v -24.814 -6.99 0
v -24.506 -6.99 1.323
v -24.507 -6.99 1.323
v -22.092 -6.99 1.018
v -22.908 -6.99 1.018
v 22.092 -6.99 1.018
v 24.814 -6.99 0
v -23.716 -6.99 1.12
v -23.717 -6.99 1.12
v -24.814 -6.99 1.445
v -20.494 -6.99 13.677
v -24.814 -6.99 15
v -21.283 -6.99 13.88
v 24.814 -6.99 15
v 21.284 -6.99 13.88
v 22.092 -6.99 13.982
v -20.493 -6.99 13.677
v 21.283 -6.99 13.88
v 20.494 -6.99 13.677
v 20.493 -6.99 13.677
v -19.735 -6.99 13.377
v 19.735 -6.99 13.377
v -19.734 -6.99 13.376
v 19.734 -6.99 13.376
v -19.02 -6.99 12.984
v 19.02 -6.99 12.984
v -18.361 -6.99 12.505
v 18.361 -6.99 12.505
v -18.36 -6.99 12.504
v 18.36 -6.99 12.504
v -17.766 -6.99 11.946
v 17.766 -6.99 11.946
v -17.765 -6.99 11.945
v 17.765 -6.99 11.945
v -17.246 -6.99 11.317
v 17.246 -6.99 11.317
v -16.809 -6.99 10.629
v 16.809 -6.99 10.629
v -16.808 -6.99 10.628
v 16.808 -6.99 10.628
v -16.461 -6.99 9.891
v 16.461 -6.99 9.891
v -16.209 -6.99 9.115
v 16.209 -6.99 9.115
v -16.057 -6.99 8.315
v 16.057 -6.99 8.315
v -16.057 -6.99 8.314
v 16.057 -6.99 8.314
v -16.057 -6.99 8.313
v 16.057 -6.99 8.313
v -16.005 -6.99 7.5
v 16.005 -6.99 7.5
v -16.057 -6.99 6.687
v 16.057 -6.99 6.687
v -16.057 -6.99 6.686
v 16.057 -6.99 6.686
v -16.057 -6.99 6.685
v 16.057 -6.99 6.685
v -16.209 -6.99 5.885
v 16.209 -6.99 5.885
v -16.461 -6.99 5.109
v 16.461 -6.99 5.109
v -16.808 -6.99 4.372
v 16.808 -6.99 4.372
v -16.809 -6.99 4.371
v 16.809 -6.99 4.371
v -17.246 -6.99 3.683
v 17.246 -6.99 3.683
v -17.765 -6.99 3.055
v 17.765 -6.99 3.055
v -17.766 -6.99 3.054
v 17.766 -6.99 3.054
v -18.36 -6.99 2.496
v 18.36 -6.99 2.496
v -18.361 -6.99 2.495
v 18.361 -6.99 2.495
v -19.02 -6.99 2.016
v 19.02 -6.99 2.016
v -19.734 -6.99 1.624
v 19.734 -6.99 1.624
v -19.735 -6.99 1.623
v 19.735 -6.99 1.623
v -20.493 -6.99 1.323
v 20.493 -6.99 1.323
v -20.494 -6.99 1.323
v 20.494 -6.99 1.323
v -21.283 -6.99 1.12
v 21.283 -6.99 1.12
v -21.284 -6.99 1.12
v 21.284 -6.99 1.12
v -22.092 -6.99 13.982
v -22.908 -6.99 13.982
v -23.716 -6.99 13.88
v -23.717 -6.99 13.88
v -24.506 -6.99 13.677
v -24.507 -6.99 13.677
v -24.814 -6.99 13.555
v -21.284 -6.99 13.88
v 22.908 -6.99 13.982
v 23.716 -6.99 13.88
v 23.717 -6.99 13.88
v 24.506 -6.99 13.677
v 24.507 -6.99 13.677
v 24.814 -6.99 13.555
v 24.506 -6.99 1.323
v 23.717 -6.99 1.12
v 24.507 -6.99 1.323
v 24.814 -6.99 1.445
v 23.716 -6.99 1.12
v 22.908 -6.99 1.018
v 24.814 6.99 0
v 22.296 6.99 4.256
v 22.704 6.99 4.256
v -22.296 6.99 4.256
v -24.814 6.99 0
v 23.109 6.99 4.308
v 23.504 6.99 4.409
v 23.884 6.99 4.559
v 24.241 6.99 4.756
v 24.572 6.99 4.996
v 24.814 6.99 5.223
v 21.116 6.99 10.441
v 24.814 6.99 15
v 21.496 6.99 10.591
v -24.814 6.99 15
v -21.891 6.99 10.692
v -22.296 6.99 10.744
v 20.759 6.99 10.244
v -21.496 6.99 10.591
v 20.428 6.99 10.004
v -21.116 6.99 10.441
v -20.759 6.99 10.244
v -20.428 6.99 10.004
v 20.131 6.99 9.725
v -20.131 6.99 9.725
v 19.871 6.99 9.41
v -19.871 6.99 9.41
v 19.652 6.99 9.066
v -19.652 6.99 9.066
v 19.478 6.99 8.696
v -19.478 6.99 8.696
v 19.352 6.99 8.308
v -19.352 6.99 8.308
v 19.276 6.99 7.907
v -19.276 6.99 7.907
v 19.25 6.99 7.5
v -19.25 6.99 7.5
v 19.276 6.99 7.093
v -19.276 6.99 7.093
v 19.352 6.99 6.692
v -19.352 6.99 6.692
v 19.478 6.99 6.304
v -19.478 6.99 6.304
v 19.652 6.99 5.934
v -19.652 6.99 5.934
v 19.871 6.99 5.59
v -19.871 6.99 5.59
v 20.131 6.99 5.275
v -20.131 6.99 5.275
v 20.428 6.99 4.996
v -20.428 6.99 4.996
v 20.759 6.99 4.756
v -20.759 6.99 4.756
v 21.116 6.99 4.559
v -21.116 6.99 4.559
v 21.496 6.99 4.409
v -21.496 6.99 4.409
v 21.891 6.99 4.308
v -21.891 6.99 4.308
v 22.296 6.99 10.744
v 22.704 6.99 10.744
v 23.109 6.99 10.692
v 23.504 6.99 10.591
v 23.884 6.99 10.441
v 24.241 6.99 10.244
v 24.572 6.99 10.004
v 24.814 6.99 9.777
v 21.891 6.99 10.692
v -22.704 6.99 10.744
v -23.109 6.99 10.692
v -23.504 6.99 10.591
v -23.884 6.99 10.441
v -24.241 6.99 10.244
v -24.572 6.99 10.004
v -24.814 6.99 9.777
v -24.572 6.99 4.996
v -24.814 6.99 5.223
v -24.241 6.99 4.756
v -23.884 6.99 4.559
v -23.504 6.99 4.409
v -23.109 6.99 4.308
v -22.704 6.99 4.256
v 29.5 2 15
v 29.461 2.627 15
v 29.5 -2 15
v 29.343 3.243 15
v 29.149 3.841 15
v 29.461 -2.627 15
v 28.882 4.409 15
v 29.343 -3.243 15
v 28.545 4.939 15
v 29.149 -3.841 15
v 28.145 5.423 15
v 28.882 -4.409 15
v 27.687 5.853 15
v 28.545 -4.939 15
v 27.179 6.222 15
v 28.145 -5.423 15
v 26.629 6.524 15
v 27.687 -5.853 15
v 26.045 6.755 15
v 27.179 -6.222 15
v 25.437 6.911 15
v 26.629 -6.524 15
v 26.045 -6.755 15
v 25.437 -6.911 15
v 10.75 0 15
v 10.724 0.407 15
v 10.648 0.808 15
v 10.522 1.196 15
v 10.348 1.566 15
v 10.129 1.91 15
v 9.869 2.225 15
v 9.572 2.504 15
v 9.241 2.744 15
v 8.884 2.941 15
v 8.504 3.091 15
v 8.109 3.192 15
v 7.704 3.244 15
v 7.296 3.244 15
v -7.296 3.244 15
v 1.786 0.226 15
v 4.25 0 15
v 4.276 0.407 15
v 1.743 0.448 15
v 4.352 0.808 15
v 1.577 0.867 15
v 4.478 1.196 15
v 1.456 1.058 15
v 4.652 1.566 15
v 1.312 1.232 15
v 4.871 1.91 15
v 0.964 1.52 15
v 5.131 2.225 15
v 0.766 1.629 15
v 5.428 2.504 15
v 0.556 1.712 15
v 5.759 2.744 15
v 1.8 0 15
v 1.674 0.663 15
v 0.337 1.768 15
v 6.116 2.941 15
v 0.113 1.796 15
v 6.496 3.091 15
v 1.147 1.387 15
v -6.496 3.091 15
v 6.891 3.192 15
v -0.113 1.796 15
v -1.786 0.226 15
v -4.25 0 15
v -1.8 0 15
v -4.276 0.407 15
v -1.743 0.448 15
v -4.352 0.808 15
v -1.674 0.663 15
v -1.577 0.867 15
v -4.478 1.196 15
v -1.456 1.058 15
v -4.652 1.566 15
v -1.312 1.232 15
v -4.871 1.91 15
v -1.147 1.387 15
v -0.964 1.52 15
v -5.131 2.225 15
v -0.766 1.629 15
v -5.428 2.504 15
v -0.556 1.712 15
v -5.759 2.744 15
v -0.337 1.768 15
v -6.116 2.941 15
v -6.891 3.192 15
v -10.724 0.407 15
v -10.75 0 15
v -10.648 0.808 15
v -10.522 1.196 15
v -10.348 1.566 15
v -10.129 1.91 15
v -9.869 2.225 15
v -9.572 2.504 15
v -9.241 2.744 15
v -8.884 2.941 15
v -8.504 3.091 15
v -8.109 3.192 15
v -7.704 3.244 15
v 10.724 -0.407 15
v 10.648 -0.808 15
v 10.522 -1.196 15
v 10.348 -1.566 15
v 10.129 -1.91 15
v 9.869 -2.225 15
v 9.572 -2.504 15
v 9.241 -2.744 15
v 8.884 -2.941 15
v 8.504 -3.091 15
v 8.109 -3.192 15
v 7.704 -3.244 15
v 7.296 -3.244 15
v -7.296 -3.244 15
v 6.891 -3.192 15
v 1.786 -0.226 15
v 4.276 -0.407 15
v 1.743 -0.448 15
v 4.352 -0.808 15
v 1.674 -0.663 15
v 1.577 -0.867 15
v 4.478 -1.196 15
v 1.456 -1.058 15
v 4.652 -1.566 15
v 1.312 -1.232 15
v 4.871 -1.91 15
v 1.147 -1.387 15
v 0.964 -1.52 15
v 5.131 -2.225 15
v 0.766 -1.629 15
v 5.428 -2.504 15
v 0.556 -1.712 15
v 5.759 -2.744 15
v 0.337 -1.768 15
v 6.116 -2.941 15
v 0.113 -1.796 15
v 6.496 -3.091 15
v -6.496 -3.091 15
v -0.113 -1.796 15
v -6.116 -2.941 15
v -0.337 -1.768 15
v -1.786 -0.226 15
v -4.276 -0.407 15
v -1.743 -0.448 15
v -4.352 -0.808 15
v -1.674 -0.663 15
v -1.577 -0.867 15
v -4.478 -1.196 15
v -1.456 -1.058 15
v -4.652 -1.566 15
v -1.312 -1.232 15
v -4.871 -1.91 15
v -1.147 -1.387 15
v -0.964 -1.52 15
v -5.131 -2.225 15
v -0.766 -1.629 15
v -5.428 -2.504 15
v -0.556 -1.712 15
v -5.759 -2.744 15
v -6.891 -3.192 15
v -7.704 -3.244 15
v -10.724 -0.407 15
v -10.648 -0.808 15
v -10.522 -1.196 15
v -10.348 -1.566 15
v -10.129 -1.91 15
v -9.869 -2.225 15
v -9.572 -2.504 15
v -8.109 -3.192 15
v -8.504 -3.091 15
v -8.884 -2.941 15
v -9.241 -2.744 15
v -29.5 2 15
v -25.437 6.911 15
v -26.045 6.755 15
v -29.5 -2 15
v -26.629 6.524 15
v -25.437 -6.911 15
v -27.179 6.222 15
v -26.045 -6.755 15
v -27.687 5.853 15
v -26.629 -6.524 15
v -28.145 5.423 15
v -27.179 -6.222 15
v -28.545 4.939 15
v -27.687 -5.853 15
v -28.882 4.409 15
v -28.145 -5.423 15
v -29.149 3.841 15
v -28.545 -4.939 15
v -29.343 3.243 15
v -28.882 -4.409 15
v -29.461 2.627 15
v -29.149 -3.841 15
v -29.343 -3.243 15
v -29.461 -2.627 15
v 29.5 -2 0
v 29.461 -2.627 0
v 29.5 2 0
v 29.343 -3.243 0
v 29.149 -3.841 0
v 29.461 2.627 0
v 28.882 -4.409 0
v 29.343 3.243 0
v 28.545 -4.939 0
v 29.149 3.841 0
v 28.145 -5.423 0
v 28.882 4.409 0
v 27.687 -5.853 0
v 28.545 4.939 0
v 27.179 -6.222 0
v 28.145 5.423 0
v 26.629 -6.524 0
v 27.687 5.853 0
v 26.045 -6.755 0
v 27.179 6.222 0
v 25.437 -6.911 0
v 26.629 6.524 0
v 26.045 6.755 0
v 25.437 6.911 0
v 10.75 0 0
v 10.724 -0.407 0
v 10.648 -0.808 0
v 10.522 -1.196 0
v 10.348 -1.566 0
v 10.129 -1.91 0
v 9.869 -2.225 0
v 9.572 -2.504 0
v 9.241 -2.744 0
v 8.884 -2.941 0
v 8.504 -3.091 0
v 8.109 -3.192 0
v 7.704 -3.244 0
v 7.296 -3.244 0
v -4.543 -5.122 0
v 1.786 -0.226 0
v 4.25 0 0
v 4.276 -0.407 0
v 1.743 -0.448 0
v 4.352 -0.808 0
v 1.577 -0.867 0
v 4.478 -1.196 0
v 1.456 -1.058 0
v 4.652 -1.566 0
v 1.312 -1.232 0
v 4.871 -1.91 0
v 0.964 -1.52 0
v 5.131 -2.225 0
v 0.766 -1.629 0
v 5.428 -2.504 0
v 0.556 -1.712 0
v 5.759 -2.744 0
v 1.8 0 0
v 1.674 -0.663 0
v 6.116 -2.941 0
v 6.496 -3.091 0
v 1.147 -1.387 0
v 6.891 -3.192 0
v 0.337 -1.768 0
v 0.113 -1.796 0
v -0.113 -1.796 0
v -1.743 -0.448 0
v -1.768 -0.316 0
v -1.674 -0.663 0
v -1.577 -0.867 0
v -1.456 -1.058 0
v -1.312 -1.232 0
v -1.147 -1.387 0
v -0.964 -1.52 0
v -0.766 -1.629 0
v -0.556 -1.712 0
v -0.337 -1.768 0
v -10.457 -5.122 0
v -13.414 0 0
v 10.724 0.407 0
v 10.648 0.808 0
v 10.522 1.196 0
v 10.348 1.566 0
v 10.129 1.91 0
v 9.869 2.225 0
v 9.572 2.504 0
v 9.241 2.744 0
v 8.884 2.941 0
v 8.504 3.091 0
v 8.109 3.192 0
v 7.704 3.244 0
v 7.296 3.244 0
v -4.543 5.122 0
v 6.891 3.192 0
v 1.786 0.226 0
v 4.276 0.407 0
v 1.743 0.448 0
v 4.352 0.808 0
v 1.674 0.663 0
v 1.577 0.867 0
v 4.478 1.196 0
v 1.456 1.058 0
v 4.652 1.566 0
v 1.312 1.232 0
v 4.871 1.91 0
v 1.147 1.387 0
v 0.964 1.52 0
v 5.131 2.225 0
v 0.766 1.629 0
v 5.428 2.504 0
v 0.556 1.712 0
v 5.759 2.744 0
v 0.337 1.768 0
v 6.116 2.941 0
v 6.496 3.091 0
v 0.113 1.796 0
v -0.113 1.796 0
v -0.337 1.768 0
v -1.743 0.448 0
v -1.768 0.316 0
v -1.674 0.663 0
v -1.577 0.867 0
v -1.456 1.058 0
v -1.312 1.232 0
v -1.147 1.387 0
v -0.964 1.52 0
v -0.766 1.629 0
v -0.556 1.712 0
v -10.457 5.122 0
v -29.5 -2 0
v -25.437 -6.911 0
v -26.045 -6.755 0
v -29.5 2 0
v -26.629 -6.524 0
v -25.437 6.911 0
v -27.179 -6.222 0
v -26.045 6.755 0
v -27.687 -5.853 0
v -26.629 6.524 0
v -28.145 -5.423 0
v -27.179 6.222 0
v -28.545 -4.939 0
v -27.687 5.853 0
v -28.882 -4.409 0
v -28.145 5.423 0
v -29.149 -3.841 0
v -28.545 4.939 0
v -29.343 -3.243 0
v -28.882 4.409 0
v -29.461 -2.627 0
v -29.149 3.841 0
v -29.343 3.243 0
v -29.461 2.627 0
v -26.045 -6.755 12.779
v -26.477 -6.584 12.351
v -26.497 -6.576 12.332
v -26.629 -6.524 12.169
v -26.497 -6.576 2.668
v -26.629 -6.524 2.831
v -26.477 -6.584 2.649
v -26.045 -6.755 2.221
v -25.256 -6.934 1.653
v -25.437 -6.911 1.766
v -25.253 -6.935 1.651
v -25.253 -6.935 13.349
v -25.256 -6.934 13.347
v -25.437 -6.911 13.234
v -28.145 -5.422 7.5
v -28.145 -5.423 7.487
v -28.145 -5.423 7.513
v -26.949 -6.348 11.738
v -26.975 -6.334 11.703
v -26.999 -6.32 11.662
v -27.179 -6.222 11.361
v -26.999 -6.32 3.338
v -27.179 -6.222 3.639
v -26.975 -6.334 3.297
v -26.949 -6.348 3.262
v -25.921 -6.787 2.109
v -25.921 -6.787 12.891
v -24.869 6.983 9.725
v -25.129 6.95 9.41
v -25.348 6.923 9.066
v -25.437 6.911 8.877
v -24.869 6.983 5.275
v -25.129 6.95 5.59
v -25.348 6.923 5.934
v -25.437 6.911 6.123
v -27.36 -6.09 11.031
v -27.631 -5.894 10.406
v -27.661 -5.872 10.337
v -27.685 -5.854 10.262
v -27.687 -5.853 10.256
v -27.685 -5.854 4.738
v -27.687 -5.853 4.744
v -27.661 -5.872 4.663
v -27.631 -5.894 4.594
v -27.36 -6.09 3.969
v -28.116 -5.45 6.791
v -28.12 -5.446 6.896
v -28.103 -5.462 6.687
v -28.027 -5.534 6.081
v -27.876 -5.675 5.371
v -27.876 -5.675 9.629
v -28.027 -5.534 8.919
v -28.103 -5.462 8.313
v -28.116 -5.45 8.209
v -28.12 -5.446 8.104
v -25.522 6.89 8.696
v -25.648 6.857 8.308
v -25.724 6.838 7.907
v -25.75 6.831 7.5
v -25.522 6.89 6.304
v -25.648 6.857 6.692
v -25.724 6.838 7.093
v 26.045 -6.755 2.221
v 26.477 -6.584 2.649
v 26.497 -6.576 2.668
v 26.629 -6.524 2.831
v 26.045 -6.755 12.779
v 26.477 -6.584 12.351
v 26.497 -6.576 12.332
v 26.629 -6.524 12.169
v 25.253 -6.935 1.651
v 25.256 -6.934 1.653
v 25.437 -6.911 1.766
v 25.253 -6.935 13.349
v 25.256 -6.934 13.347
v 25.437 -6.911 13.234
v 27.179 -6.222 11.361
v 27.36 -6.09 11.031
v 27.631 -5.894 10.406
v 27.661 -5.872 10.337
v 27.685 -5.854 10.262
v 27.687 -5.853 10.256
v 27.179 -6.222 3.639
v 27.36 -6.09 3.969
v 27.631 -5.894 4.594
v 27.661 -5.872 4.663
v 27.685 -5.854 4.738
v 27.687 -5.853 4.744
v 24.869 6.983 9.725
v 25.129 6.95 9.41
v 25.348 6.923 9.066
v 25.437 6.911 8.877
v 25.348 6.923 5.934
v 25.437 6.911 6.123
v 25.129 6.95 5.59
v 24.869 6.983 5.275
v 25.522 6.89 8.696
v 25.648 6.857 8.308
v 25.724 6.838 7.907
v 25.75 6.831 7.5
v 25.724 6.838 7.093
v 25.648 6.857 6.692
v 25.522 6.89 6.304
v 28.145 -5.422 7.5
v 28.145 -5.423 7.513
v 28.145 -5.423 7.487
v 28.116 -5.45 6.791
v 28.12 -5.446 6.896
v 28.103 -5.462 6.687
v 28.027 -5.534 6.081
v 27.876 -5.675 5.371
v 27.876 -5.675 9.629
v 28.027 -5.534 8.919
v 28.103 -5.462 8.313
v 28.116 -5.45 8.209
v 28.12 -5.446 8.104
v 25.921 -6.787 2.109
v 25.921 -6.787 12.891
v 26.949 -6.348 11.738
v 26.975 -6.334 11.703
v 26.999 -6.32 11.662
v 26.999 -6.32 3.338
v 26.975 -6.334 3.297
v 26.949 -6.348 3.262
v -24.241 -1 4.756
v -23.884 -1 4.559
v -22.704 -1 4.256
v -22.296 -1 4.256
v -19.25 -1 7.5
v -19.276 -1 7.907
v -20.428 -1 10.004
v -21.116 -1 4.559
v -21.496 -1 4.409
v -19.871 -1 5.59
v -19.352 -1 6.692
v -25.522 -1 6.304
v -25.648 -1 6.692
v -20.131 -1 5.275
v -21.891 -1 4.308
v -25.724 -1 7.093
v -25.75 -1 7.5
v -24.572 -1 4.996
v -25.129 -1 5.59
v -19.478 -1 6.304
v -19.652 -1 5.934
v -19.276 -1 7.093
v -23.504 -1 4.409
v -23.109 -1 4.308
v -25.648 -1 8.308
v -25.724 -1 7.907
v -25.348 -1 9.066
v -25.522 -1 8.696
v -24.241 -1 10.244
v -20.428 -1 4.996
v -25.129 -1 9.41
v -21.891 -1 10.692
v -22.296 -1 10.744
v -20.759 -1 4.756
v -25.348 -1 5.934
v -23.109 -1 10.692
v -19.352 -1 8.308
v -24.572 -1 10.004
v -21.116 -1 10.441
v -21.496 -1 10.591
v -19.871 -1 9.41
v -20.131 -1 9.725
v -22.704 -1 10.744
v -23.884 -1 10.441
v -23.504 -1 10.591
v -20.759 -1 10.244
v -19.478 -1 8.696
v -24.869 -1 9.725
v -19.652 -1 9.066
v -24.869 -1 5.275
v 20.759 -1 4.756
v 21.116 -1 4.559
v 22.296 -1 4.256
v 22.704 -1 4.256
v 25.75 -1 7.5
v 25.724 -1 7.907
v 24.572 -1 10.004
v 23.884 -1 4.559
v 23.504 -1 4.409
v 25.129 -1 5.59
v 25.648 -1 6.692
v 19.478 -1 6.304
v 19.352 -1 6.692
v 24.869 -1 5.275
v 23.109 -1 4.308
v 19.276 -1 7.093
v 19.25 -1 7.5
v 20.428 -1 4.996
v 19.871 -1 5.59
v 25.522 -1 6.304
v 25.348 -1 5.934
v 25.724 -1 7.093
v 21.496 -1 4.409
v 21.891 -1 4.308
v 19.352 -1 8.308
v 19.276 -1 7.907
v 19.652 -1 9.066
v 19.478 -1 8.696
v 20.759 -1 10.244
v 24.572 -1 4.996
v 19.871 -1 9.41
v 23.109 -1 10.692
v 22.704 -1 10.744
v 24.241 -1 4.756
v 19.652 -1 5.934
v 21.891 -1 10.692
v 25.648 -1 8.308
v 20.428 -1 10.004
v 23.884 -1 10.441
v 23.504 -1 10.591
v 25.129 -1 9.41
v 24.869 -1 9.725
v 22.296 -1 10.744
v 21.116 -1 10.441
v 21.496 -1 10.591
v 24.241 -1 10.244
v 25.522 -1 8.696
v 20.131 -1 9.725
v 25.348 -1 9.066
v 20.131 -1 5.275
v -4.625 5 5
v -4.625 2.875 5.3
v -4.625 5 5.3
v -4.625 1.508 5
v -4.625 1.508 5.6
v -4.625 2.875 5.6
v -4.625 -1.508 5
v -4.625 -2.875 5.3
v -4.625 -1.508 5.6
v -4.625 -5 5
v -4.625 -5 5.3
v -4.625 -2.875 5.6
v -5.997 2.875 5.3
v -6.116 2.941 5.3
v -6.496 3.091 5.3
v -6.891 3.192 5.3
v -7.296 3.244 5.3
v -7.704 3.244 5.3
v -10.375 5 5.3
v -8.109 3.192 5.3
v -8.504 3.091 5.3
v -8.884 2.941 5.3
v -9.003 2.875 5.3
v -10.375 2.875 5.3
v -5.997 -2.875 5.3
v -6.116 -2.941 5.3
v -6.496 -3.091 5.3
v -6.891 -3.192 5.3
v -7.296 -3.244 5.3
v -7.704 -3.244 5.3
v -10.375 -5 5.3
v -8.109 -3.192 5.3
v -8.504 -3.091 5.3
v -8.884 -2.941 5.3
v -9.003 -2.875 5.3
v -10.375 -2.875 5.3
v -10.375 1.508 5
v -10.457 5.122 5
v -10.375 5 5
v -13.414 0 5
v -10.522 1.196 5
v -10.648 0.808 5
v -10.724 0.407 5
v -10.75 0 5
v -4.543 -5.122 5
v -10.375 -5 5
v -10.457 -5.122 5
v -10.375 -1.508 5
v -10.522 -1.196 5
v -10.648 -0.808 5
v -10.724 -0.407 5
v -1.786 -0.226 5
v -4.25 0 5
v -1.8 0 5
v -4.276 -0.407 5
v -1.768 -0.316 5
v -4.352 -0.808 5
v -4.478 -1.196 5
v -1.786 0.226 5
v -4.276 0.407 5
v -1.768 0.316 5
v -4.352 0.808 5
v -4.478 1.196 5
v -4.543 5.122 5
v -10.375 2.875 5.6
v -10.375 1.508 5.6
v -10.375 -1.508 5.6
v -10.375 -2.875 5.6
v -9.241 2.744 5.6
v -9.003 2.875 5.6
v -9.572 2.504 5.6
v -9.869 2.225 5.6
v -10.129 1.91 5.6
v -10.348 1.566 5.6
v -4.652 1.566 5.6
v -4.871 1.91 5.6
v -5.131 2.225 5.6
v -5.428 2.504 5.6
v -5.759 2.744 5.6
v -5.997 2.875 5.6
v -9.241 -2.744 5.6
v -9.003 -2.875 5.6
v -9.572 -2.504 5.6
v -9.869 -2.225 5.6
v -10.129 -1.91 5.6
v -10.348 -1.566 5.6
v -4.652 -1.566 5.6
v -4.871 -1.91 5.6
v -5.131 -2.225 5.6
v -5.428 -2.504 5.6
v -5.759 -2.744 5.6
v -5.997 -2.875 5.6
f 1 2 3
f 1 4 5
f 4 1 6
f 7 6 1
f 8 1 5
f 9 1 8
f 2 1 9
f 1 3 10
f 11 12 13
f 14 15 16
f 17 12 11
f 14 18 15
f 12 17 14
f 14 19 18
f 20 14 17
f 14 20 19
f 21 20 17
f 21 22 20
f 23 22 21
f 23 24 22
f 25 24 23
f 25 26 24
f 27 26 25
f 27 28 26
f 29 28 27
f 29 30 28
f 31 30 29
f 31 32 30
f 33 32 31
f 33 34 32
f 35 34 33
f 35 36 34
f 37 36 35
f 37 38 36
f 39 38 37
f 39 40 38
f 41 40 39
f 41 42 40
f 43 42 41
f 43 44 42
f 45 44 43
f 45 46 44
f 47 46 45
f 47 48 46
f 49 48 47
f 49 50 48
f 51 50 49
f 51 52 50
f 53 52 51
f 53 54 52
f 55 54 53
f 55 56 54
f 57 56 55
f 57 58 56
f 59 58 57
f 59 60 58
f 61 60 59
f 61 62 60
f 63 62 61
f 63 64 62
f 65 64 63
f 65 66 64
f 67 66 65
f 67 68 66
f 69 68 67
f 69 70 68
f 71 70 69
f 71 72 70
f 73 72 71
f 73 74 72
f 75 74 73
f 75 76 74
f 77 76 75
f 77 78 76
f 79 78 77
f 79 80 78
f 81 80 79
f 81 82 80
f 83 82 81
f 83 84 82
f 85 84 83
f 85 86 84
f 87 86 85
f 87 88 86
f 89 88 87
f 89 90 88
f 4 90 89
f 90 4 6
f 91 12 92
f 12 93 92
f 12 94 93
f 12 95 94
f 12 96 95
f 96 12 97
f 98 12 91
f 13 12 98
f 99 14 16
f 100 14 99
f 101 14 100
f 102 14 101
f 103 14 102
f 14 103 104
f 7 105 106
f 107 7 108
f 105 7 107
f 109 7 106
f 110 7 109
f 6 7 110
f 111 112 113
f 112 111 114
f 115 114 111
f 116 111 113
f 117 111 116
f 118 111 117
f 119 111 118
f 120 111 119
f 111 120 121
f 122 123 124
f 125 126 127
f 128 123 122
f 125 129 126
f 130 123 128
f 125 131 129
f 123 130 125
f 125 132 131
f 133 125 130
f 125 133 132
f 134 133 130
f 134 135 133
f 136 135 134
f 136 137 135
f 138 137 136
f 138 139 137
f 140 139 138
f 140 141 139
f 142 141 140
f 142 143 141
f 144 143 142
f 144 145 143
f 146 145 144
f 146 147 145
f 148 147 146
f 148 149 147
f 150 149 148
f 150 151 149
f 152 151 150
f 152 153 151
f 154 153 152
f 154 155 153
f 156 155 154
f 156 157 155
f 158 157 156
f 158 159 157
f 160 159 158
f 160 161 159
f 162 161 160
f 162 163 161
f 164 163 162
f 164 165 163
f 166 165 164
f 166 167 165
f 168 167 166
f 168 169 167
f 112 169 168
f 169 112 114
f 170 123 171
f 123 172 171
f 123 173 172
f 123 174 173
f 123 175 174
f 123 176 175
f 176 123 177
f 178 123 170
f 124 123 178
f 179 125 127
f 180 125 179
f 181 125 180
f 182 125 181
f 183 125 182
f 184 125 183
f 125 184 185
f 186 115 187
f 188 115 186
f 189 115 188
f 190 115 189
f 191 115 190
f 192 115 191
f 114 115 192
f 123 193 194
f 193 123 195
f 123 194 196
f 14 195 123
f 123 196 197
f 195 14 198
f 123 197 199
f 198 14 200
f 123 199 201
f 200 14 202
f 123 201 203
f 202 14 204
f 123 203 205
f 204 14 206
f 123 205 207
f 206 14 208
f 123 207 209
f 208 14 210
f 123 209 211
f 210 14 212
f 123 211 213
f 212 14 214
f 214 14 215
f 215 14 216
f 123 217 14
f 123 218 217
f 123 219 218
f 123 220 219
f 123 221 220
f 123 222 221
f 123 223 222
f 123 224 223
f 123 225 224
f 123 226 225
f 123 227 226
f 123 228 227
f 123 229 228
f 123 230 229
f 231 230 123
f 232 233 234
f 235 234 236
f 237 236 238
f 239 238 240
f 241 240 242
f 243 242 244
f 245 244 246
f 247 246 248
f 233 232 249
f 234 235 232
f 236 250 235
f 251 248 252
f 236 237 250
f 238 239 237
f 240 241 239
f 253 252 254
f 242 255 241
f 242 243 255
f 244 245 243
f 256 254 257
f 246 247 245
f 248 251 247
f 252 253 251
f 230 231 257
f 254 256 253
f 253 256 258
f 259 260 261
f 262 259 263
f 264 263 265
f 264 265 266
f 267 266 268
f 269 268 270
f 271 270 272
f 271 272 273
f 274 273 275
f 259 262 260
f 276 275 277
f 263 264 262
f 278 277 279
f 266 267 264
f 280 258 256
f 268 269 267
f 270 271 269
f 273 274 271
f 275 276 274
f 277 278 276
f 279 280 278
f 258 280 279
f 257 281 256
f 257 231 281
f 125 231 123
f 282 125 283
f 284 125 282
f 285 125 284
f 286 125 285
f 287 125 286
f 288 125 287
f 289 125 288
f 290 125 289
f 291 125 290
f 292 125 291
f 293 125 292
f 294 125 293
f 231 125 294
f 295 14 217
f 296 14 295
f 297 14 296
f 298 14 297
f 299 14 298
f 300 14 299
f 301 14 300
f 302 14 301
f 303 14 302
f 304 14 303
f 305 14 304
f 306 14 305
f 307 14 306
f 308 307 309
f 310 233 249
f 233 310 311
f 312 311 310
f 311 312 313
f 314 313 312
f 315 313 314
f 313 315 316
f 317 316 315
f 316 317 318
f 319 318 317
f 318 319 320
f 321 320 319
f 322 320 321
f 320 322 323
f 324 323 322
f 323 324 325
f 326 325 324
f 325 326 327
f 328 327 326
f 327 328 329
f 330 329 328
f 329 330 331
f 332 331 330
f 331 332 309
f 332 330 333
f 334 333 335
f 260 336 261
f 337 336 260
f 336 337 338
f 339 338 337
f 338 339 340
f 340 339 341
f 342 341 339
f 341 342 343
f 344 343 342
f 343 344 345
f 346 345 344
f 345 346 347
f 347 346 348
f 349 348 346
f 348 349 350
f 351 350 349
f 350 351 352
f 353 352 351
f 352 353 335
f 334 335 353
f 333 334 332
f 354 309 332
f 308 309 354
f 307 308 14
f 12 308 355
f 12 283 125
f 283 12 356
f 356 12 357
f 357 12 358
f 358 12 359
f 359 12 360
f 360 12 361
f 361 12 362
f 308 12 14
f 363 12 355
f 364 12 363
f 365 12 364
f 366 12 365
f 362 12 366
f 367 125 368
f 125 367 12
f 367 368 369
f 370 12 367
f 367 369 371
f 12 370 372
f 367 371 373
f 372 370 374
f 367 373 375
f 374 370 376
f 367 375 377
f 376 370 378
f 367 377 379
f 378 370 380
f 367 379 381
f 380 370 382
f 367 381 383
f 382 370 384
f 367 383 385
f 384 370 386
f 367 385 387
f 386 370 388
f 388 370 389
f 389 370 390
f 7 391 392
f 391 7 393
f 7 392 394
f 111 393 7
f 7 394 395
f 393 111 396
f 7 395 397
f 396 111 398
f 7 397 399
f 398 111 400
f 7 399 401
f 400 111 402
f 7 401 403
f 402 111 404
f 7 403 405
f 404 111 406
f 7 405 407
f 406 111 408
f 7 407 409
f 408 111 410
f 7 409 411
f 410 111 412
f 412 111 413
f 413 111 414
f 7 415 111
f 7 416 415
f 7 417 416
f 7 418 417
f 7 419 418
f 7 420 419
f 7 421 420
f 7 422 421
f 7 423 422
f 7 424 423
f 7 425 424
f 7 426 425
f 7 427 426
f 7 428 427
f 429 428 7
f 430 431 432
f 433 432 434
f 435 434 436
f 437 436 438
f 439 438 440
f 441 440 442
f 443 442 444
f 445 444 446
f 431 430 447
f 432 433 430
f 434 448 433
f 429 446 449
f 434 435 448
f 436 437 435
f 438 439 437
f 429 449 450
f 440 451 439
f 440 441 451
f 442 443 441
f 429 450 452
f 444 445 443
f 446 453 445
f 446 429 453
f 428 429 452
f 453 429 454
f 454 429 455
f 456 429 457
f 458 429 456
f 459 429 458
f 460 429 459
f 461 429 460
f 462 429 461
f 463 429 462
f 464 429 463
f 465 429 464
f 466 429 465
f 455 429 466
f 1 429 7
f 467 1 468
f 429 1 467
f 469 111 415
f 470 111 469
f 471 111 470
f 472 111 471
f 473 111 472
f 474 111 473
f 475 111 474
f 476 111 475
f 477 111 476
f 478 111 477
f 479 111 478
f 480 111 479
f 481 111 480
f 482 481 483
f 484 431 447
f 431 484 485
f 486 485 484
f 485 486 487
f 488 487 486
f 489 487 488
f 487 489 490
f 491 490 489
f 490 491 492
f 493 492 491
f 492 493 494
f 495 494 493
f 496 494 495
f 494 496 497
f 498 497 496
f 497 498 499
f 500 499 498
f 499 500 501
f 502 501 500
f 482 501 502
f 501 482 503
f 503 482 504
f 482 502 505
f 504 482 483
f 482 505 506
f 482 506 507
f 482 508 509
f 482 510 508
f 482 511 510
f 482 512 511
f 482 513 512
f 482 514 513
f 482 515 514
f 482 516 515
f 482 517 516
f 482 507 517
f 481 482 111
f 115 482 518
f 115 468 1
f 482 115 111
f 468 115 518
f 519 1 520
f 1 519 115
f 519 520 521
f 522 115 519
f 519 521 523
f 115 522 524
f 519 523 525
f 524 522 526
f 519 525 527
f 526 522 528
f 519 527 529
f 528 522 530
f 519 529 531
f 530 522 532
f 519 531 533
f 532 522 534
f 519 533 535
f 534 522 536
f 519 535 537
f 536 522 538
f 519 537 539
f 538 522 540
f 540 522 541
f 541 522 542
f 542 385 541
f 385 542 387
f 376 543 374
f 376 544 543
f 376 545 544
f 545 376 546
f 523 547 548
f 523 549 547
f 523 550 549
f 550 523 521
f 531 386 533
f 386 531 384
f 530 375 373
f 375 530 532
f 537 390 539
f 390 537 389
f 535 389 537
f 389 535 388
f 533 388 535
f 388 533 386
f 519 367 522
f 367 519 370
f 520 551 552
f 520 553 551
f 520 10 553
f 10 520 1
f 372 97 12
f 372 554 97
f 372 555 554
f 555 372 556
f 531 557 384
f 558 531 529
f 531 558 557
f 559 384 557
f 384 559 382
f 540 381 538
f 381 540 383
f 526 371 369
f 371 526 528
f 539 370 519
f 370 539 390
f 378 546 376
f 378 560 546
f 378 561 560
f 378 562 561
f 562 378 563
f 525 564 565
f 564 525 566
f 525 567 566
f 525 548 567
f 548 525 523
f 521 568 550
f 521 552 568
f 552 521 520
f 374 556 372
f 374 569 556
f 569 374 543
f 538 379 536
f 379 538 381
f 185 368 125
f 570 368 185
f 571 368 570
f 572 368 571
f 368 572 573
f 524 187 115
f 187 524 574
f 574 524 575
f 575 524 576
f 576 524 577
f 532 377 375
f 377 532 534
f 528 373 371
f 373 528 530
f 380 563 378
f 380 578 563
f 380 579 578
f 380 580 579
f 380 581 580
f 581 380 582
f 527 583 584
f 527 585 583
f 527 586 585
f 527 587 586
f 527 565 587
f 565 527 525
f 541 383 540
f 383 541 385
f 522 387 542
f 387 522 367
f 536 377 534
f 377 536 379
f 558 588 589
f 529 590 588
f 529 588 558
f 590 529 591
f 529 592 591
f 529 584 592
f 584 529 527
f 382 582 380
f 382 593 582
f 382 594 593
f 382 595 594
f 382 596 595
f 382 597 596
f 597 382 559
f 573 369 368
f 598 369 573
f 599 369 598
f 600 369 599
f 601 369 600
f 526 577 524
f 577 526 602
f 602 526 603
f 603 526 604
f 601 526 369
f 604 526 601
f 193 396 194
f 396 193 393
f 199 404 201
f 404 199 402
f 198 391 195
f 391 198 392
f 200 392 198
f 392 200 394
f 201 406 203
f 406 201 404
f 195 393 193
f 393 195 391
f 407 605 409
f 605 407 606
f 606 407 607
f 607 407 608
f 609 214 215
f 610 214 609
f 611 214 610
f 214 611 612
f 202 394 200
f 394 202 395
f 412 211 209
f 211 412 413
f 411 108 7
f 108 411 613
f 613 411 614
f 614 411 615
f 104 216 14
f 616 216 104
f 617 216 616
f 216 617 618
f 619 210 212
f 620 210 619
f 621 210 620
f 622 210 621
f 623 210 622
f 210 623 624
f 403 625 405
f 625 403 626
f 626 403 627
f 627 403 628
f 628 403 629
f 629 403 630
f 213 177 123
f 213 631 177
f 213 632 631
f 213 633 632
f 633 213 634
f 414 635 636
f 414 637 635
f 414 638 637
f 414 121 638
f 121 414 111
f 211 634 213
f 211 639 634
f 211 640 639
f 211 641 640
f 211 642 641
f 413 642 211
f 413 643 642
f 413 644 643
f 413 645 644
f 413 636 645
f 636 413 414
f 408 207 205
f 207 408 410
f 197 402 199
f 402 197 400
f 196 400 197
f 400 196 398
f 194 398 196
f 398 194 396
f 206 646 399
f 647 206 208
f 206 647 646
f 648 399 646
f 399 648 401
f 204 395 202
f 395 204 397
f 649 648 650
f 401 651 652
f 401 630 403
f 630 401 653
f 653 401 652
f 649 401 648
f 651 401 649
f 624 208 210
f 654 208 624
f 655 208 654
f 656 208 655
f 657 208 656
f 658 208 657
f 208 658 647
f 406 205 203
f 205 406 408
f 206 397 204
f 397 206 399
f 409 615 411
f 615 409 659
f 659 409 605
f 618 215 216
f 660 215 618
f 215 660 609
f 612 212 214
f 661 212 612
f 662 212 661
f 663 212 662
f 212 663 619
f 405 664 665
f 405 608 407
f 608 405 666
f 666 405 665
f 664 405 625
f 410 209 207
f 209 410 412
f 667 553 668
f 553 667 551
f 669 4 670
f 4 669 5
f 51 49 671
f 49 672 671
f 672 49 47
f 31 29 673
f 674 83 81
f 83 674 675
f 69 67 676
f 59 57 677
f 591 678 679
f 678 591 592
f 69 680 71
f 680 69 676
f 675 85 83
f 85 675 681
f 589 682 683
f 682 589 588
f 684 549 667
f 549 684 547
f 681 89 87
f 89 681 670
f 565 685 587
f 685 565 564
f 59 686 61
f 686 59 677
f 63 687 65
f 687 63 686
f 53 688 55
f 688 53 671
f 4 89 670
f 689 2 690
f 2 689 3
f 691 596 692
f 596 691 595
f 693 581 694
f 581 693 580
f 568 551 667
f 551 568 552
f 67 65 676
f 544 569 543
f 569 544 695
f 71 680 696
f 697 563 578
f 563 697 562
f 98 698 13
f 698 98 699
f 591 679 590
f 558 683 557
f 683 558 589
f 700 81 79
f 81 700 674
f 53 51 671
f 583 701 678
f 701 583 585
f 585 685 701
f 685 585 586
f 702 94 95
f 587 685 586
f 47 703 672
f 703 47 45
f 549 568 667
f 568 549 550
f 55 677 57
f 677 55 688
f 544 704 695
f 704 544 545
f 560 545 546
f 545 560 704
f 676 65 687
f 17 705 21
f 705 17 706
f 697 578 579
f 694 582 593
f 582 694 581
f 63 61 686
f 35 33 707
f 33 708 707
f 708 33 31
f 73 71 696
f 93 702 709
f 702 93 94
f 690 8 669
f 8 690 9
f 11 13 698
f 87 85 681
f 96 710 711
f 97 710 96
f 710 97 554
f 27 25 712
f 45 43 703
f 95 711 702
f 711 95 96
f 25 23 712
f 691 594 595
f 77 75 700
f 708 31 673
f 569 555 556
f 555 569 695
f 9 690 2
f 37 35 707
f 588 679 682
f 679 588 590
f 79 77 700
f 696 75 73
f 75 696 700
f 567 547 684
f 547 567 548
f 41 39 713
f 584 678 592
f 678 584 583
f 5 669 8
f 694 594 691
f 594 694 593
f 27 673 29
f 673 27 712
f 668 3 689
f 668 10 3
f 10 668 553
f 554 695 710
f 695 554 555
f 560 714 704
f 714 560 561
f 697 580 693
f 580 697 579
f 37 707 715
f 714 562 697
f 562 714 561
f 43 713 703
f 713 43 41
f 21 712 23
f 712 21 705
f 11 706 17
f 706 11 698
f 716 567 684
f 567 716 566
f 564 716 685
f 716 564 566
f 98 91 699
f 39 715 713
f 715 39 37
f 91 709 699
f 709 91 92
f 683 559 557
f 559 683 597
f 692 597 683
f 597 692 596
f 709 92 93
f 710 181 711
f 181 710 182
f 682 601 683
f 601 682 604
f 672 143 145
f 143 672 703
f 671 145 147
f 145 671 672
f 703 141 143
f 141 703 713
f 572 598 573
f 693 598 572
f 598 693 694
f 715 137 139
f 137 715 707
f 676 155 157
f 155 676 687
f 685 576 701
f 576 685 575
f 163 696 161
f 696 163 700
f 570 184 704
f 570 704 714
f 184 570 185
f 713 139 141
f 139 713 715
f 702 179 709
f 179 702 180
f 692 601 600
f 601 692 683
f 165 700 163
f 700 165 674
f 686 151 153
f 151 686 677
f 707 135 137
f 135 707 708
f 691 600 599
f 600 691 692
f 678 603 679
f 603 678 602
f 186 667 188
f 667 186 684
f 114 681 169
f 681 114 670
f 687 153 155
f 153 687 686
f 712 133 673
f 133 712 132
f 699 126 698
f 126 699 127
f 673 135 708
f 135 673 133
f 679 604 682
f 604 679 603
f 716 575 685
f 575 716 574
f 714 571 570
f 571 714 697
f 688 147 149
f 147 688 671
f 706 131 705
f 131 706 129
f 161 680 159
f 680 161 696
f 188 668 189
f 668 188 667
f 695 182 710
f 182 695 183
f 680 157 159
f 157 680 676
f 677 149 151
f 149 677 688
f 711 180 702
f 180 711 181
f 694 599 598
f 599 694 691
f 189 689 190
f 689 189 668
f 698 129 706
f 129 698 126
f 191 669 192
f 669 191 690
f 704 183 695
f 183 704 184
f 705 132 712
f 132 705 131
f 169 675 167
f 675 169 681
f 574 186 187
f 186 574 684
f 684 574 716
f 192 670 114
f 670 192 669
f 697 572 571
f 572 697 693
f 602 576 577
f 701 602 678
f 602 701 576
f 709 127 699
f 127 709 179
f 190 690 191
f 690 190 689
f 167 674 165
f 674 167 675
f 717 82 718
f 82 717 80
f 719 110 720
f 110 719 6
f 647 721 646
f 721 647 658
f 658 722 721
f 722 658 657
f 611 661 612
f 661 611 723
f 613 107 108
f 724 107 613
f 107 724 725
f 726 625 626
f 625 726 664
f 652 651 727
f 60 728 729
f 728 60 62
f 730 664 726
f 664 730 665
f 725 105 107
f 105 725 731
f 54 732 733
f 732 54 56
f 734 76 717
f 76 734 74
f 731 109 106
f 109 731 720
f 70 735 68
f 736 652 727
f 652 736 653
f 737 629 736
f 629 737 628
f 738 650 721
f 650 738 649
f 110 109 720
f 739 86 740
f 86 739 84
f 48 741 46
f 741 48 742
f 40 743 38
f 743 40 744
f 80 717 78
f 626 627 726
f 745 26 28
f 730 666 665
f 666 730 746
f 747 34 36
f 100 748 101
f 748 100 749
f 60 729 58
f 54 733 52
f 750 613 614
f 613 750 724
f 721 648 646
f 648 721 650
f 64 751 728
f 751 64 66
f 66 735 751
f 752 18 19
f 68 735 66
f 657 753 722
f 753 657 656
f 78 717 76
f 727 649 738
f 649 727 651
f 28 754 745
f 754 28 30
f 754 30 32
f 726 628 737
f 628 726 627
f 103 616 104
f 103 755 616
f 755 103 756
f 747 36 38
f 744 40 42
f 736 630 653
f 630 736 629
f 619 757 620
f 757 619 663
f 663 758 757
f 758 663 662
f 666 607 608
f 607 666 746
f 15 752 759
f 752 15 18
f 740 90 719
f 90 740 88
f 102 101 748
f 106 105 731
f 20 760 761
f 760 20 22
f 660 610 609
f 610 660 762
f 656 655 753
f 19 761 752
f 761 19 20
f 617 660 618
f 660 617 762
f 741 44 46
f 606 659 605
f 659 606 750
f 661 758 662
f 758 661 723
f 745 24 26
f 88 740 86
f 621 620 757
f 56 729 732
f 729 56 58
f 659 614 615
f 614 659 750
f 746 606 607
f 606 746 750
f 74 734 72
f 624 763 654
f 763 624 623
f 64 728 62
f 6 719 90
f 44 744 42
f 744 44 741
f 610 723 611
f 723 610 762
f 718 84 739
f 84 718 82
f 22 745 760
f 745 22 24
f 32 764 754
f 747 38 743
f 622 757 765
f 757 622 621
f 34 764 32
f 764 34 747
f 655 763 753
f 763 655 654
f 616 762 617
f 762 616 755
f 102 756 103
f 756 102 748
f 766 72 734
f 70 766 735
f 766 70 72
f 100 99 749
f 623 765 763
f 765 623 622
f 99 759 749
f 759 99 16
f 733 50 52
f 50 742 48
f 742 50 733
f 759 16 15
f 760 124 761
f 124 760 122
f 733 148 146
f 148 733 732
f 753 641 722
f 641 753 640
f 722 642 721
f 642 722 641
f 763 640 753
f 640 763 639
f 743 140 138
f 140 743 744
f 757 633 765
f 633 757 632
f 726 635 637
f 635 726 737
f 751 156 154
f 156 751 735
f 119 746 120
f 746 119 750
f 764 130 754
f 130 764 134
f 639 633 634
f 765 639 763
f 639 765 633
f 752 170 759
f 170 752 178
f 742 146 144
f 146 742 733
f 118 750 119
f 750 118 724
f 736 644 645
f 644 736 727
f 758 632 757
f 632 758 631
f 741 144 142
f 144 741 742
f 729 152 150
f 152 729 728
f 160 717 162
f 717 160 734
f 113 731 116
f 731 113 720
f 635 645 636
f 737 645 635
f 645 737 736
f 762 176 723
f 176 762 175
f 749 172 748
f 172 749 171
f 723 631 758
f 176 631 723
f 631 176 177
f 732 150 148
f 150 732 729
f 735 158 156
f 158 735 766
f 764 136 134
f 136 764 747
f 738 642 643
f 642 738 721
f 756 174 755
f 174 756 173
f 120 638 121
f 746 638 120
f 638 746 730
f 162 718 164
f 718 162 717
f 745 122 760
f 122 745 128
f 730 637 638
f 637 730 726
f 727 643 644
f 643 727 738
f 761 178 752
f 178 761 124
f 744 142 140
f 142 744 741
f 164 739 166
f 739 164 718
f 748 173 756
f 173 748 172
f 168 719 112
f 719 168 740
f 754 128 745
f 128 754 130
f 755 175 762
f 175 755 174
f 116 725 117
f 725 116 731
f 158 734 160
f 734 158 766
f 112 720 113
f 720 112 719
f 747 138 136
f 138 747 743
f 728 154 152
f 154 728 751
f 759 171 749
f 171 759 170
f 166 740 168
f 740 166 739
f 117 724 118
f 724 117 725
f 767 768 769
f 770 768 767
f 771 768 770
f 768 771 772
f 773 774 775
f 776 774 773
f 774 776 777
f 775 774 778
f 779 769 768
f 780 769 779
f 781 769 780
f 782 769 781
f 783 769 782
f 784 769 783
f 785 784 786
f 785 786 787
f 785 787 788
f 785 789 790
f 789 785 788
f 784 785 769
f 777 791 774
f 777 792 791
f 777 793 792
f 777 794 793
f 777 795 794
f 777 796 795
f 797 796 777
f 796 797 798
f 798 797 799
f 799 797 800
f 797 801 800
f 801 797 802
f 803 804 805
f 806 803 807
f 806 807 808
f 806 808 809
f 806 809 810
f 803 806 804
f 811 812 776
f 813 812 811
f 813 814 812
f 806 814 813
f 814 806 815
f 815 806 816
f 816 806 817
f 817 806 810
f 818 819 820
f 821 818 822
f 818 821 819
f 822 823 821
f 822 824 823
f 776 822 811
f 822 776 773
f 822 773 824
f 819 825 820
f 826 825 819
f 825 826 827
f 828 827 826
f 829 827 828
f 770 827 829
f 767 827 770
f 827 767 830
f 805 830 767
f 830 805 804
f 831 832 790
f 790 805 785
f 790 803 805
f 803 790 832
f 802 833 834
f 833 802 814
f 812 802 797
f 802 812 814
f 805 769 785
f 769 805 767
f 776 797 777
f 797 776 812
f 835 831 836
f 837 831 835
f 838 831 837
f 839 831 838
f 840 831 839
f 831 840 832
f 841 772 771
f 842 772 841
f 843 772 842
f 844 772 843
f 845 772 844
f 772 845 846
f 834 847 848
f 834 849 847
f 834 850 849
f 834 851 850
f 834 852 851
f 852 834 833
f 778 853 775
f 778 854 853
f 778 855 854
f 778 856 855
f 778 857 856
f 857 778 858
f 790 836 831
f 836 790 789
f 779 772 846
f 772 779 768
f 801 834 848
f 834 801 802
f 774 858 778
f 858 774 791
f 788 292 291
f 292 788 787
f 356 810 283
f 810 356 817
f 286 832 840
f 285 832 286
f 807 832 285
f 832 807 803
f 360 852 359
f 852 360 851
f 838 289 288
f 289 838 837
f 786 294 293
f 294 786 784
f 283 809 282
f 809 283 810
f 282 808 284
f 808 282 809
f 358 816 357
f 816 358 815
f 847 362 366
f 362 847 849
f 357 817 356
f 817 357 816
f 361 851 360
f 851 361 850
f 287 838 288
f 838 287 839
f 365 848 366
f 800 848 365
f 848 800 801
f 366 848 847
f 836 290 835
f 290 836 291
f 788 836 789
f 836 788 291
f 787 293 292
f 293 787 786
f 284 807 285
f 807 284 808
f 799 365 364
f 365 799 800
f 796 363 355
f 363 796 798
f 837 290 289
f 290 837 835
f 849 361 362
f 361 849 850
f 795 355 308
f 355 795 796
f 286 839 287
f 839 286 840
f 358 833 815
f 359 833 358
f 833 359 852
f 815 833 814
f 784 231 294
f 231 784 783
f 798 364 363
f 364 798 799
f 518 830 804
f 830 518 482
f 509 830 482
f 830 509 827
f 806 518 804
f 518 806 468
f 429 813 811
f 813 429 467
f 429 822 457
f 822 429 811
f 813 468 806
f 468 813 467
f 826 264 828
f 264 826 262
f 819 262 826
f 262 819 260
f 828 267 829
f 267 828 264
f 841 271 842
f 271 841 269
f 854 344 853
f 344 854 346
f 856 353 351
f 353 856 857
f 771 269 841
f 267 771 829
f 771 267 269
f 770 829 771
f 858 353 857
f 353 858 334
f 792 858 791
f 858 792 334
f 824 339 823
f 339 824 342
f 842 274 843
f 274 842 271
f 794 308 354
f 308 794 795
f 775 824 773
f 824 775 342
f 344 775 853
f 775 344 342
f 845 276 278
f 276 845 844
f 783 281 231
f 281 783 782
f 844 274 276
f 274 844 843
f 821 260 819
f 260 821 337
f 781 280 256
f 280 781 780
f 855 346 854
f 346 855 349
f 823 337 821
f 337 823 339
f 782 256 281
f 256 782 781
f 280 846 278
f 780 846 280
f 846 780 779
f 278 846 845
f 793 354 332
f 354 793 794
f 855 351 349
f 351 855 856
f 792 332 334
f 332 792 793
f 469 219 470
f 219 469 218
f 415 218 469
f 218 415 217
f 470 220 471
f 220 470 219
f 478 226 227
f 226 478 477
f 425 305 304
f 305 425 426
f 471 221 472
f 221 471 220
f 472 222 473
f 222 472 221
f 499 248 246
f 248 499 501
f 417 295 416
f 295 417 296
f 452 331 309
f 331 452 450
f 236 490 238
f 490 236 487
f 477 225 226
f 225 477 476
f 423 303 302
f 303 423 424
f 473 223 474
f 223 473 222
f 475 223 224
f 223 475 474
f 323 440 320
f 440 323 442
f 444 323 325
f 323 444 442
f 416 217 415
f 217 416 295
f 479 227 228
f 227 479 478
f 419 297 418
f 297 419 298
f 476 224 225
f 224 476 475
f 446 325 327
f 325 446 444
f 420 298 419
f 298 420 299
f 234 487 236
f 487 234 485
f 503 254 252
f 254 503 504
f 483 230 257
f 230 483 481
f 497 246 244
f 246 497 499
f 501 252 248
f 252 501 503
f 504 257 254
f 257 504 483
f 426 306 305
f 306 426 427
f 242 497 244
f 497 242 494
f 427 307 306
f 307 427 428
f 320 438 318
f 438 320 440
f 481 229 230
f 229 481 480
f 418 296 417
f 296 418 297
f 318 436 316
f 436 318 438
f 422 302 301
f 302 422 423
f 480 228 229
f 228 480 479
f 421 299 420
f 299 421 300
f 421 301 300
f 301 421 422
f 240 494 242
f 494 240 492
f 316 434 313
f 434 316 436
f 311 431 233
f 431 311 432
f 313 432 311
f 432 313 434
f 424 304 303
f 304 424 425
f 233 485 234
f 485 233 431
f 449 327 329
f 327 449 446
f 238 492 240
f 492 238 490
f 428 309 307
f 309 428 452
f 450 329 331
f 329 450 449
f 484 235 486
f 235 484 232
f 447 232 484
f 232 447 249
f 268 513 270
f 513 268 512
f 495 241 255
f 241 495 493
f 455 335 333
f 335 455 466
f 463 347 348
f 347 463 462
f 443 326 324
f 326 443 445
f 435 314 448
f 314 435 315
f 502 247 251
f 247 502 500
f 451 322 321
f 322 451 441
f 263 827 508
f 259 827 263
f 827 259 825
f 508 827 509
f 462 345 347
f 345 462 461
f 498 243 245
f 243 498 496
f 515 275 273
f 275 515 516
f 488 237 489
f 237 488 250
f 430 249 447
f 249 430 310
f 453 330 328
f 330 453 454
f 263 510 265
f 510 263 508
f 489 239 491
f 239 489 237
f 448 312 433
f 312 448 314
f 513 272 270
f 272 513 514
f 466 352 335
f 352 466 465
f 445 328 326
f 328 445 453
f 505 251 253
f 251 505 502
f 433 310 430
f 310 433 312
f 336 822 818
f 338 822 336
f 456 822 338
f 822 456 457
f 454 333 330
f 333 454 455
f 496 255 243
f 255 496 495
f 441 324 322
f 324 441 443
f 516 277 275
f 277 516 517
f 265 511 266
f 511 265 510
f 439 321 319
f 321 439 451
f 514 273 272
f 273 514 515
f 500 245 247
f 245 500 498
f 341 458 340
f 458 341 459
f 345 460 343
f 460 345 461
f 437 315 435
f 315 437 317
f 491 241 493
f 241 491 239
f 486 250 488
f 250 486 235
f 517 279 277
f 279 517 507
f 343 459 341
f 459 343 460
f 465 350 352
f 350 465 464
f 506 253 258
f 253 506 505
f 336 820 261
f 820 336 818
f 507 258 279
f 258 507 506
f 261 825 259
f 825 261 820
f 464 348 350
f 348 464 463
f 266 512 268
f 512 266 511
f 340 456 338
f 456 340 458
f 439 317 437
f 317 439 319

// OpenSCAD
$fn = 50;


difference() {
	union() {
		hull() {
			translate(v = [-9.5000000000, 2.0000000000, 0]) {
				cylinder(h = 15, r = 5);
			}
			translate(v = [9.5000000000, 2.0000000000, 0]) {
				cylinder(h = 15, r = 5);
			}
			translate(v = [-9.5000000000, -2.0000000000, 0]) {
				cylinder(h = 15, r = 5);
			}
			translate(v = [9.5000000000, -2.0000000000, 0]) {
				cylinder(h = 15, r = 5);
			}
		}
		translate(v = [-15.0000000000, 0.0000000000, 0]) {
			hull() {
				translate(v = [-9.5000000000, 2.0000000000, 0]) {
					cylinder(h = 15, r = 5);
				}
				translate(v = [9.5000000000, 2.0000000000, 0]) {
					cylinder(h = 15, r = 5);
				}
				translate(v = [-9.5000000000, -2.0000000000, 0]) {
					cylinder(h = 15, r = 5);
				}
				translate(v = [9.5000000000, -2.0000000000, 0]) {
					cylinder(h = 15, r = 5);
				}
			}
		}
		translate(v = [-15.0000000000, 0.0000000000, 0]) {
			hull() {
				translate(v = [-9.5000000000, 2.0000000000, 0]) {
					cylinder(h = 15, r = 5);
				}
				translate(v = [9.5000000000, 2.0000000000, 0]) {
					cylinder(h = 15, r = 5);
				}
				translate(v = [-9.5000000000, -2.0000000000, 0]) {
					cylinder(h = 15, r = 5);
				}
				translate(v = [9.5000000000, -2.0000000000, 0]) {
					cylinder(h = 15, r = 5);
				}
			}
		}
		translate(v = [15.0000000000, 0.0000000000, 0]) {
			hull() {
				translate(v = [-9.5000000000, 2.0000000000, 0]) {
					cylinder(h = 15, r = 5);
				}
				translate(v = [9.5000000000, 2.0000000000, 0]) {
					cylinder(h = 15, r = 5);
				}
				translate(v = [-9.5000000000, -2.0000000000, 0]) {
					cylinder(h = 15, r = 5);
				}
				translate(v = [9.5000000000, -2.0000000000, 0]) {
					cylinder(h = 15, r = 5);
				}
			}
		}
		translate(v = [15.0000000000, 0.0000000000, 0]) {
			hull() {
				translate(v = [-9.5000000000, 2.0000000000, 0]) {
					cylinder(h = 15, r = 5);
				}
				translate(v = [9.5000000000, 2.0000000000, 0]) {
					cylinder(h = 15, r = 5);
				}
				translate(v = [-9.5000000000, -2.0000000000, 0]) {
					cylinder(h = 15, r = 5);
				}
				translate(v = [9.5000000000, -2.0000000000, 0]) {
					cylinder(h = 15, r = 5);
				}
			}
		}
	}
	union() {
		translate(v = [-22.5000000000, -7.0000000000, 7.5000000000]) {
			rotate(a = [90, 0, 0]) {
				difference() {
					union() {
						#translate(v = [0, 0, -14.0000000000]) {
							cylinder(h = 14, r = 2.2500000000);
						}
						#translate(v = [0, 0, -6]) {
							cylinder(h = 6, r1 = 3.2500000000, r2 = 6.5000000000);
						}
						#translate(v = [0, 0, -14.0000000000]) {
							cylinder(h = 14, r = 3.2500000000);
						}
						#translate(v = [0, 0, -14.0000000000]) {
							cylinder(h = 14, r = 2.2500000000);
						}
					}
					union();
				}
			}
		}
		translate(v = [22.5000000000, -7.0000000000, 7.5000000000]) {
			rotate(a = [90, 0, 0]) {
				difference() {
					union() {
						#translate(v = [0, 0, -14.0000000000]) {
							cylinder(h = 14, r = 2.2500000000);
						}
						#translate(v = [0, 0, -6]) {
							cylinder(h = 6, r1 = 3.2500000000, r2 = 6.5000000000);
						}
						#translate(v = [0, 0, -14.0000000000]) {
							cylinder(h = 14, r = 3.2500000000);
						}
						#translate(v = [0, 0, -14.0000000000]) {
							cylinder(h = 14, r = 2.2500000000);
						}
					}
					union();
				}
			}
		}
		translate(v = [-7.5000000000, 0.0000000000, 0]) {
			rotate(a = [0, 0, 0]) {
				difference() {
					union() {
						#translate(v = [-2.8750000000, -5.0000000000, -0.3000000000]) {
							cube(size = [5.7500000000, 10, 0.3000000000]);
						}
						#translate(v = [-2.8750000000, -2.8750000000, -0.6000000000]) {
							cube(size = [5.7500000000, 5.7500000000, 0.3000000000]);
						}
						#translate(v = [-2.8750000000, -5.0000000000, 5]) {
							cube(size = [5.7500000000, 10, 0.3000000000]);
						}
						#translate(v = [-2.8750000000, -2.8750000000, 5.3000000000]) {
							cube(size = [5.7500000000, 5.7500000000, 0.3000000000]);
						}
						#translate(v = [0, 0, -100.0000000000]) {
							cylinder(h = 200, r = 3.2500000000);
						}
						#linear_extrude(height = 5) {
							polygon(points = [[5.9142500000, 0.0000000000], [2.9571250000, 5.1218907443], [-2.9571250000, 5.1218907443], [-5.9142500000, 0.0000000000], [-2.9571250000, -5.1218907443], [2.9571250000, -5.1218907443]]);
						}
						#translate(v = [-2.8750000000, -5.0000000000, -0.3000000000]) {
							cube(size = [5.7500000000, 10, 0.3000000000]);
						}
						#translate(v = [-2.8750000000, -2.8750000000, -0.6000000000]) {
							cube(size = [5.7500000000, 5.7500000000, 0.3000000000]);
						}
						#translate(v = [-2.8750000000, -5.0000000000, 5]) {
							cube(size = [5.7500000000, 10, 0.3000000000]);
						}
						#translate(v = [-2.8750000000, -2.8750000000, 5.3000000000]) {
							cube(size = [5.7500000000, 5.7500000000, 0.3000000000]);
						}
						#translate(v = [0, 0, -100.0000000000]) {
							cylinder(h = 200, r = 3.2500000000);
						}
						#translate(v = [-2.8750000000, -5.0000000000, -0.3000000000]) {
							cube(size = [5.7500000000, 10, 0.3000000000]);
						}
						#translate(v = [-2.8750000000, -2.8750000000, -0.6000000000]) {
							cube(size = [5.7500000000, 5.7500000000, 0.3000000000]);
						}
						#translate(v = [-2.8750000000, -5.0000000000, 5]) {
							cube(size = [5.7500000000, 10, 0.3000000000]);
						}
						#translate(v = [-2.8750000000, -2.8750000000, 5.3000000000]) {
							cube(size = [5.7500000000, 5.7500000000, 0.3000000000]);
						}
						#translate(v = [0, 0, -100.0000000000]) {
							cylinder(h = 200, r = 3.2500000000);
						}
					}
					union();
				}
			}
		}
		translate(v = [-7.5000000000, 0.0000000000, 0]) {
			translate(v = [0, 0, -100]) {
				cylinder(h = 200, r = 3.2500000000);
			}
		}
		translate(v = [7.5000000000, 0.0000000000, 0]) {
			translate(v = [0, 0, -100]) {
				cylinder(h = 200, r = 3.2500000000);
			}
		}
		translate(v = [-7.5000000000, 0.0000000000, 0]) {
			translate(v = [0, 0, -100]) {
				cylinder(h = 200, r = 1.8000000000);
			}
		}
		translate(v = [0, 0, -100]) {
			cylinder(h = 200, r = 1.8000000000);
		}
		translate(v = [7.5000000000, 0.0000000000, 0]) {
			translate(v = [0, 0, -100]) {
				cylinder(h = 200, r = 1.8000000000);
			}
		}
	}
}
